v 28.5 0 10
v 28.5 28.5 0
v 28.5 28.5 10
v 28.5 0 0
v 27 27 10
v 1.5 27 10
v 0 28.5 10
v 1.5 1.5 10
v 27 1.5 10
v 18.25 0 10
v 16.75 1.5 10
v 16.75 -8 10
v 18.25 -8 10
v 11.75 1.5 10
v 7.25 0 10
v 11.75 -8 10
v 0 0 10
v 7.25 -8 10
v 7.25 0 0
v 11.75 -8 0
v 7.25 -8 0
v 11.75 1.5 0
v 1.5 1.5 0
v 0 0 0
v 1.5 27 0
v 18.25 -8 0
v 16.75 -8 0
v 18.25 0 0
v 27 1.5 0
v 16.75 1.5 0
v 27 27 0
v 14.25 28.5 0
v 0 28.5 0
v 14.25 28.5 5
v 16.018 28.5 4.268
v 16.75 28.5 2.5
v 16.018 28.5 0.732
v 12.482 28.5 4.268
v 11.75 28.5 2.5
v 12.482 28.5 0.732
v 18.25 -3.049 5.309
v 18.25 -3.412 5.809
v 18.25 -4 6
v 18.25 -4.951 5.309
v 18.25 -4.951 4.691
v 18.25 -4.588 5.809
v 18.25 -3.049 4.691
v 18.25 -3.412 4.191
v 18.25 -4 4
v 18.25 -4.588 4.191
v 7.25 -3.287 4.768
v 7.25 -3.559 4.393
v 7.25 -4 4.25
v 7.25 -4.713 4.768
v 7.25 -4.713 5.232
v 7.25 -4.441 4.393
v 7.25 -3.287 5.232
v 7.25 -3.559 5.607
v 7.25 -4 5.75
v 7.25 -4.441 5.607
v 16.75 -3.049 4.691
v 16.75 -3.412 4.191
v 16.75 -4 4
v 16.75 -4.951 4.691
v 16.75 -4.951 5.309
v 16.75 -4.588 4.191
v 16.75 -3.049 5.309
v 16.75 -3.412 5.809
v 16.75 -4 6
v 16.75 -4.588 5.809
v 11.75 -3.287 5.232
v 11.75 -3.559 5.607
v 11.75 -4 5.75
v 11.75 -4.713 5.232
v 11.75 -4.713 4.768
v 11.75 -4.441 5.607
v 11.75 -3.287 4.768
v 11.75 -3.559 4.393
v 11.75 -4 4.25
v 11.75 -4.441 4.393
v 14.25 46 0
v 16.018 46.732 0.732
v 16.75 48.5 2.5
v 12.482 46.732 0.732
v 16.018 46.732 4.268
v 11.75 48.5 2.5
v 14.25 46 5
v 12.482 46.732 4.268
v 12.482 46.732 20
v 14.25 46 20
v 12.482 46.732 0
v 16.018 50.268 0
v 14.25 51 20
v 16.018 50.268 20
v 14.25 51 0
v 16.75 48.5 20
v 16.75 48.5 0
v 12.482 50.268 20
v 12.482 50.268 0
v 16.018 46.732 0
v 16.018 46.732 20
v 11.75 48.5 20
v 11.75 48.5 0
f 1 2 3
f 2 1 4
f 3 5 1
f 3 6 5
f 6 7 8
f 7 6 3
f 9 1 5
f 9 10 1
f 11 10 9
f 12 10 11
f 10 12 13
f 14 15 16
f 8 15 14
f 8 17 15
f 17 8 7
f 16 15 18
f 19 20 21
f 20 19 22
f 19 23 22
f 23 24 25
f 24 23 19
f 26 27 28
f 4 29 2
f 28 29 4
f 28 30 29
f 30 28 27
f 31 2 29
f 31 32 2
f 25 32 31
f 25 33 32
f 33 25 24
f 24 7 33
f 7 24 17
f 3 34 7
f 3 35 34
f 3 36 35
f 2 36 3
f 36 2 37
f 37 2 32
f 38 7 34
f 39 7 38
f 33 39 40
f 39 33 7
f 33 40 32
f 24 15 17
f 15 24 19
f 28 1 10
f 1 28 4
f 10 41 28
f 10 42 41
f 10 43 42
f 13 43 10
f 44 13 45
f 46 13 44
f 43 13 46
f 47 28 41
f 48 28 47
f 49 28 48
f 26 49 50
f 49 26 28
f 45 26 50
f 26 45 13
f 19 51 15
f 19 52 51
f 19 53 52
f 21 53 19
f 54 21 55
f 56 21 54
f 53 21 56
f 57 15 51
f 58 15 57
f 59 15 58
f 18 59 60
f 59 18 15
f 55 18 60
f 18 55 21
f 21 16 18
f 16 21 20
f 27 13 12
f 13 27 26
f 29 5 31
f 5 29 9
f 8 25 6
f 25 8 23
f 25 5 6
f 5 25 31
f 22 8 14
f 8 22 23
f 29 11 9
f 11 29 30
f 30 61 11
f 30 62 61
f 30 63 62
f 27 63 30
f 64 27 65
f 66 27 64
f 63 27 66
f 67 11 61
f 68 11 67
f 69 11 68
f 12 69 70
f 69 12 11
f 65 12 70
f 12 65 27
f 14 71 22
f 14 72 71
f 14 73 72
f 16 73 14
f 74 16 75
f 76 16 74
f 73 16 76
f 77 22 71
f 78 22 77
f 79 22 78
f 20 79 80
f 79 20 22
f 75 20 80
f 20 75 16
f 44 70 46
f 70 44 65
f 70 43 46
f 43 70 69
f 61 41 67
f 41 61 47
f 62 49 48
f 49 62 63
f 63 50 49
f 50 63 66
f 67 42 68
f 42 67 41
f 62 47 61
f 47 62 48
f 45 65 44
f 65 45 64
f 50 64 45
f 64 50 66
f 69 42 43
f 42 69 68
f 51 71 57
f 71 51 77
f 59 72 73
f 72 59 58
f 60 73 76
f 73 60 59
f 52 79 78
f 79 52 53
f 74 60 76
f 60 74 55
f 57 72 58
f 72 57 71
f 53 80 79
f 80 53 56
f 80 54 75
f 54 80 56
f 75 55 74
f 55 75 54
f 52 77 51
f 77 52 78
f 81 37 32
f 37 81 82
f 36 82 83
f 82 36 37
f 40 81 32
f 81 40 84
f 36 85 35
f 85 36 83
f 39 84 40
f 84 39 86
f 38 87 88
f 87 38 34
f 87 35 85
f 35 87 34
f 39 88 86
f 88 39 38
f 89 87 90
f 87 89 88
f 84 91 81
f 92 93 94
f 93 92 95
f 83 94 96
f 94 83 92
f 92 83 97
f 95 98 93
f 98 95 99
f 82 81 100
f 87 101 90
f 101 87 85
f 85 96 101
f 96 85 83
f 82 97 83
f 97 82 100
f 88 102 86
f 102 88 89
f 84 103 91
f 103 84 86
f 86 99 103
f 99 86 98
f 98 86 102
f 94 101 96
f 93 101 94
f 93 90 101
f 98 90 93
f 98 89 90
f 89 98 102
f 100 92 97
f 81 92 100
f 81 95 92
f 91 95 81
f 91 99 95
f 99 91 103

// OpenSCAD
h = 10;
w = 25.5; //20.5;
d = 25.5; //30.5;
t = 1.5;

o = (w - 5)/2;
ot = 2*t;
op = 2*t;
r_outer = 1;
r_inner = 0.75;

r = r_outer;

difference(){
    union(){
        cube([w + 2*t, d + 2*t, h]);
        translate([o + 2*(t-ot), -2*(op + r), 0])
        cube([w - 2*(o - ot), 2*(op+r), h]);
        //translate([o - t, -2*t, 0])
        //cube([w - 2*(o - 2*t), t, h]);
    }
    translate([t, t, 0])
    cube([w, d, h]);
    translate([t + o, -2*(op+r), 0])
    cube([w - 2*o, 3*(op+r), h]);
    
    translate([w/2, -r-op, h/2])
    rotate([0, 90, 0])
    cylinder(1000, r, r, $fn=10);

    translate([w/2, -r-op, h/2])
    rotate([0, -90, 0])
    cylinder(1000, r_inner, r_inner, $fn=10);
}

hook_r = 2.5;
hook_l = 20;
hook_h = 20; //10;

translate([w/2 + t, d + 2*t, hook_r])
rotate([-90, 0, 0])
cylinder(hook_l, hook_r, hook_r);

translate([w/2 + t, d + 2*t + hook_l, 0])
cylinder(hook_h, hook_r, hook_r);
